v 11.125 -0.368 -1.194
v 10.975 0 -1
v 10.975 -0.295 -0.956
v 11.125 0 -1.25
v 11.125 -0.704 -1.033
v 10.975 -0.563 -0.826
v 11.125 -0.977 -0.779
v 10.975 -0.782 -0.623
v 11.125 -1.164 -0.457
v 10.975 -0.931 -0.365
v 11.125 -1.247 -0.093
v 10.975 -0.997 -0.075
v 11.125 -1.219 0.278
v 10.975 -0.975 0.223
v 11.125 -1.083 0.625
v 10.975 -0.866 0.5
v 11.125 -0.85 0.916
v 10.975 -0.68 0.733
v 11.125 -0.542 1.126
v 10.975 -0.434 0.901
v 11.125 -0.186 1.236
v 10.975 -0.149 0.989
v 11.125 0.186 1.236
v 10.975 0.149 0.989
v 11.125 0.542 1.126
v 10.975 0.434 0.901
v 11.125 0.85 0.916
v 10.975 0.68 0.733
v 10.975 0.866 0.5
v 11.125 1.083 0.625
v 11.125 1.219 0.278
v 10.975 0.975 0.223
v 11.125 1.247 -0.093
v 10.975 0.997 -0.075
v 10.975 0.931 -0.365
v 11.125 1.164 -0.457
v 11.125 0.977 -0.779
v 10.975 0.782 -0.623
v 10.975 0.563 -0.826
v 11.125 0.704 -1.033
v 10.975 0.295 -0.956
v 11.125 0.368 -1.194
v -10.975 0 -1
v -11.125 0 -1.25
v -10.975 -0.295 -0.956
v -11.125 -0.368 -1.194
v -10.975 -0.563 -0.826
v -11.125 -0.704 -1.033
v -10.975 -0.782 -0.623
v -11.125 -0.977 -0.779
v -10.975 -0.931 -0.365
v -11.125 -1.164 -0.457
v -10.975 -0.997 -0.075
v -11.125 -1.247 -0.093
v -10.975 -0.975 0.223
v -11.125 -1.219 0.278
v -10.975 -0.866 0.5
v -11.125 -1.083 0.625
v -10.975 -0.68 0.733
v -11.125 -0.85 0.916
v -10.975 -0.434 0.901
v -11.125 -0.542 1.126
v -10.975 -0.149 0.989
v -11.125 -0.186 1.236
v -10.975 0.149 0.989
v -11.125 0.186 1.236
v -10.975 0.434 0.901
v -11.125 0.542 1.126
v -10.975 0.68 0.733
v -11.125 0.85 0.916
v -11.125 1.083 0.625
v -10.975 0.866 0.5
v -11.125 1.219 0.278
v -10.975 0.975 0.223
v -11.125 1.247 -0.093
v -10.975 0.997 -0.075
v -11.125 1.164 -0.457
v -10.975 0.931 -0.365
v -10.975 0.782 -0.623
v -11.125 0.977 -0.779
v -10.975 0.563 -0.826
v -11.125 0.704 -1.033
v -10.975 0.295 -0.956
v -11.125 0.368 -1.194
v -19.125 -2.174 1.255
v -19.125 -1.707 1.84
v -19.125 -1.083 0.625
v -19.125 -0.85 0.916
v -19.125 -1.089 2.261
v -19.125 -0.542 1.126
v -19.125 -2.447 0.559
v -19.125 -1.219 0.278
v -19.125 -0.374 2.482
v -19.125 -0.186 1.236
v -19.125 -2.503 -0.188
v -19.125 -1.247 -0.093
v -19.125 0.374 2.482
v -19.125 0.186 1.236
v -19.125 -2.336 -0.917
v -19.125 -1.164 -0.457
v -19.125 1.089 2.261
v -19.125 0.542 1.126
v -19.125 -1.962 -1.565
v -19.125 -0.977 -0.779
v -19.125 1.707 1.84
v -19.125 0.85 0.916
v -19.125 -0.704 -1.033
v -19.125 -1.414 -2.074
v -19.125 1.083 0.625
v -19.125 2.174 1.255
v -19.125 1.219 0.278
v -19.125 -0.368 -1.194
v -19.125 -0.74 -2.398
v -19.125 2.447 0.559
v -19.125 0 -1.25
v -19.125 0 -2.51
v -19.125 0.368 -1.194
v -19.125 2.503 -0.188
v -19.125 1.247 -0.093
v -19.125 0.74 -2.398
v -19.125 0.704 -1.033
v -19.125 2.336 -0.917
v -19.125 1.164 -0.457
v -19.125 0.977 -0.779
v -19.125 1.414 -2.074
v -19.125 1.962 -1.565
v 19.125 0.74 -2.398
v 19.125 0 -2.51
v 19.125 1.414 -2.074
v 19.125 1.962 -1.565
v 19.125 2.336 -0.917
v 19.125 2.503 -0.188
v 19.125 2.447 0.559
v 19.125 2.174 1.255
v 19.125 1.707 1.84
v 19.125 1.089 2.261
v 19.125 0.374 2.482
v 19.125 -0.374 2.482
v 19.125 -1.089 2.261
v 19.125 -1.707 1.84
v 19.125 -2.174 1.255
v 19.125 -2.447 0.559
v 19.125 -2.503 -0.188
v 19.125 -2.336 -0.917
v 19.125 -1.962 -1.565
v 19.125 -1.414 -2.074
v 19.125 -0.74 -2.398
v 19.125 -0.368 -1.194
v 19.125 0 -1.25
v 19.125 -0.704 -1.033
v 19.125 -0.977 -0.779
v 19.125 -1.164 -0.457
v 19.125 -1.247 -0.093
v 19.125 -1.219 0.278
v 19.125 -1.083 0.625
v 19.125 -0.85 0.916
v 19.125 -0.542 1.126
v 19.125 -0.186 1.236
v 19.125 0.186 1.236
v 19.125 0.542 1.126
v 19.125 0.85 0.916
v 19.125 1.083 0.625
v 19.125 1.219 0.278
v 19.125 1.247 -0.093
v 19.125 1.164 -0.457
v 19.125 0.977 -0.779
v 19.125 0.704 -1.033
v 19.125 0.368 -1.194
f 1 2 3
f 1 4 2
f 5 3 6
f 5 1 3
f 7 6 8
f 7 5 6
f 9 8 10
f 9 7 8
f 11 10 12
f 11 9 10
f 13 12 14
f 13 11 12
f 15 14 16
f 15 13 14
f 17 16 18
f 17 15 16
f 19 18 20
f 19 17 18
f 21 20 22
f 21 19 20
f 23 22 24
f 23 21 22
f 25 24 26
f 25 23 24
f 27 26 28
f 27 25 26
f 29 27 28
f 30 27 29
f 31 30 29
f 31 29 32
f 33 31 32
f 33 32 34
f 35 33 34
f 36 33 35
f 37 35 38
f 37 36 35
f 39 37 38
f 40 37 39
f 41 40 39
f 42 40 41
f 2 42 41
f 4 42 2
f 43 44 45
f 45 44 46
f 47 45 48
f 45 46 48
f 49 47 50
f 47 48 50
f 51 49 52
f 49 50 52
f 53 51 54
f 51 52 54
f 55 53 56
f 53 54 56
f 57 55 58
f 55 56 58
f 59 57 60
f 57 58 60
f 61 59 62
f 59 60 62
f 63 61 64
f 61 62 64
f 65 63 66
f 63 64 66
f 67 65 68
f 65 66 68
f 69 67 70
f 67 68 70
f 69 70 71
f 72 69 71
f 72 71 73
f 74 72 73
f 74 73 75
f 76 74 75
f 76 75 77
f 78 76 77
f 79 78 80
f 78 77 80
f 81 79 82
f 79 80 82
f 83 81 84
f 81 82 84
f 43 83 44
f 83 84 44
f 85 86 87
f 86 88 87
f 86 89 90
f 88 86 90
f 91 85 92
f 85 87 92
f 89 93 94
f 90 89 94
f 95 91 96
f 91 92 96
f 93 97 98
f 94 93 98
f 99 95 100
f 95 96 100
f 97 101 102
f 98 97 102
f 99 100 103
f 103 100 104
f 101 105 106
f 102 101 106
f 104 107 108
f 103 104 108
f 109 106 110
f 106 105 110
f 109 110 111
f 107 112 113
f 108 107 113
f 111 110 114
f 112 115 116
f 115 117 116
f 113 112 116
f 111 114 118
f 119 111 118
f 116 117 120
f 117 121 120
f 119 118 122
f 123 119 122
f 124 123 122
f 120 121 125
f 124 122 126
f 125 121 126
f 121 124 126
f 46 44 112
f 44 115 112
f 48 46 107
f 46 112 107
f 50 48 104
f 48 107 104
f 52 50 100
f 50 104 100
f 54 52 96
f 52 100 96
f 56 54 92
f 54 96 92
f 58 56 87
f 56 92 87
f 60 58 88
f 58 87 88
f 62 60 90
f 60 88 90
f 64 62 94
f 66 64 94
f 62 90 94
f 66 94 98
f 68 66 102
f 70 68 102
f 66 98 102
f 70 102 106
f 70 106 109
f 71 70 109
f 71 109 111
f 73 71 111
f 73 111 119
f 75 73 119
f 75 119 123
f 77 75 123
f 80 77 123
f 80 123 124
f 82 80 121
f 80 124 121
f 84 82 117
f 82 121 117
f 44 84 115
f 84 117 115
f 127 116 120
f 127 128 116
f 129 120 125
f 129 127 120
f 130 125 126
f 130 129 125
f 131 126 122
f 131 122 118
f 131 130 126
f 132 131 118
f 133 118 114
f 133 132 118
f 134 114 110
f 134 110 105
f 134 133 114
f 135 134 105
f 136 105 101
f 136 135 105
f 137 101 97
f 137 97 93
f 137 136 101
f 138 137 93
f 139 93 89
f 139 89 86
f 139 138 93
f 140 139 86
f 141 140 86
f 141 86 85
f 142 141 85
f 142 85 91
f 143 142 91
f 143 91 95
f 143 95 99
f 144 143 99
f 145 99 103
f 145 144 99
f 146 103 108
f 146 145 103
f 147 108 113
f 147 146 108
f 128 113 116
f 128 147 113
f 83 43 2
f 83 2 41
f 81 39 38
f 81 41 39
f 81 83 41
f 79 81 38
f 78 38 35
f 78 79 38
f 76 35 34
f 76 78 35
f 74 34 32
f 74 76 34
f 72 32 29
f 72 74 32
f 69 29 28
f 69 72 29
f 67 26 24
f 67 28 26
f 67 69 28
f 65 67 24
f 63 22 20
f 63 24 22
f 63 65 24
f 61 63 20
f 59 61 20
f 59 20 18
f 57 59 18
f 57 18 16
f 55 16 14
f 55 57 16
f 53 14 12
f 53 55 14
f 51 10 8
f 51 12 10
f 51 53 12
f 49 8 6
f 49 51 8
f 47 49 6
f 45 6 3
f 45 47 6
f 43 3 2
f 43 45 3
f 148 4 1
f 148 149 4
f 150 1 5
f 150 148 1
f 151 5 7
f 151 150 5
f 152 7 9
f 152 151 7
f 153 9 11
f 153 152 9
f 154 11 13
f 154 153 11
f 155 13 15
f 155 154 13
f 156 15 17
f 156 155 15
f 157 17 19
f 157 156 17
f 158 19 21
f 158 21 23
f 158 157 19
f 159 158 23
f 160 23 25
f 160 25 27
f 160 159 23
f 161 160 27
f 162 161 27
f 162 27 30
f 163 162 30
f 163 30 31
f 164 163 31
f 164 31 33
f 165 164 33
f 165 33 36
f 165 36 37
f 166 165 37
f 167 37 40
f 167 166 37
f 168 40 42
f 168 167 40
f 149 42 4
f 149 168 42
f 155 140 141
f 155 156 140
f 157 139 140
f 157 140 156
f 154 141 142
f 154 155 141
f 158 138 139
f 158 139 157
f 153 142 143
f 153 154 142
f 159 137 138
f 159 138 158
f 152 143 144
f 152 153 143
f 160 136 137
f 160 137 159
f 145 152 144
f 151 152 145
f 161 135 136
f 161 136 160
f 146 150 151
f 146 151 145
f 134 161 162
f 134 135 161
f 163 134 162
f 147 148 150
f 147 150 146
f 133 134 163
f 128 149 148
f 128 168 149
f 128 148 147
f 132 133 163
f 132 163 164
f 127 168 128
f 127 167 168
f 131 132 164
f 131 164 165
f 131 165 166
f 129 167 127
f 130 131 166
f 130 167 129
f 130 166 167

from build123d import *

# Parameters (mm, degrees)
SCHIZZO2_R                   = 2.51
SCHIZZO2_R_2                 = 1
ESTRUSIONE_ESTRUSIONE1_DEPTH = 19.125


with BuildPart() as part:
    # Schizzo2 → Estrusione-Estrusione1 (new, symmetric)
    with BuildSketch(Plane(origin=(0, 0, 0), x_dir=(0, 0, -1), z_dir=(1, 0, 0))):
        Circle(SCHIZZO2_R)
        Circle(SCHIZZO2_R_2, mode=Mode.SUBTRACT)
    extrude(amount=ESTRUSIONE_ESTRUSIONE1_DEPTH, both=True)

    # Schizzo5 → Foro filettato M3x0.5-2 (revolve, cut)
    with BuildSketch(Plane(origin=(19.125, 0, 0), x_dir=(0, 0, -1), z_dir=(0, 1, 0))):
        Polygon((0, 0), (0, 8.751075774), (1.25, 8), (1.25, 0), align=None)
    foro_filettato_m3x0_5_2 = revolve(axis=Axis((25.475, 0, 0), (-1, 0, 0)), mode=Mode.SUBTRACT)

    # Specchia1: Foro filettato M3x0.5-2 across plane
    add(foro_filettato_m3x0_5_2.mirror(Plane(origin=(0, 0, 0), x_dir=(0, 0, 1), z_dir=(1, 0, 0))), mode=Mode.SUBTRACT)


solid = part.part
